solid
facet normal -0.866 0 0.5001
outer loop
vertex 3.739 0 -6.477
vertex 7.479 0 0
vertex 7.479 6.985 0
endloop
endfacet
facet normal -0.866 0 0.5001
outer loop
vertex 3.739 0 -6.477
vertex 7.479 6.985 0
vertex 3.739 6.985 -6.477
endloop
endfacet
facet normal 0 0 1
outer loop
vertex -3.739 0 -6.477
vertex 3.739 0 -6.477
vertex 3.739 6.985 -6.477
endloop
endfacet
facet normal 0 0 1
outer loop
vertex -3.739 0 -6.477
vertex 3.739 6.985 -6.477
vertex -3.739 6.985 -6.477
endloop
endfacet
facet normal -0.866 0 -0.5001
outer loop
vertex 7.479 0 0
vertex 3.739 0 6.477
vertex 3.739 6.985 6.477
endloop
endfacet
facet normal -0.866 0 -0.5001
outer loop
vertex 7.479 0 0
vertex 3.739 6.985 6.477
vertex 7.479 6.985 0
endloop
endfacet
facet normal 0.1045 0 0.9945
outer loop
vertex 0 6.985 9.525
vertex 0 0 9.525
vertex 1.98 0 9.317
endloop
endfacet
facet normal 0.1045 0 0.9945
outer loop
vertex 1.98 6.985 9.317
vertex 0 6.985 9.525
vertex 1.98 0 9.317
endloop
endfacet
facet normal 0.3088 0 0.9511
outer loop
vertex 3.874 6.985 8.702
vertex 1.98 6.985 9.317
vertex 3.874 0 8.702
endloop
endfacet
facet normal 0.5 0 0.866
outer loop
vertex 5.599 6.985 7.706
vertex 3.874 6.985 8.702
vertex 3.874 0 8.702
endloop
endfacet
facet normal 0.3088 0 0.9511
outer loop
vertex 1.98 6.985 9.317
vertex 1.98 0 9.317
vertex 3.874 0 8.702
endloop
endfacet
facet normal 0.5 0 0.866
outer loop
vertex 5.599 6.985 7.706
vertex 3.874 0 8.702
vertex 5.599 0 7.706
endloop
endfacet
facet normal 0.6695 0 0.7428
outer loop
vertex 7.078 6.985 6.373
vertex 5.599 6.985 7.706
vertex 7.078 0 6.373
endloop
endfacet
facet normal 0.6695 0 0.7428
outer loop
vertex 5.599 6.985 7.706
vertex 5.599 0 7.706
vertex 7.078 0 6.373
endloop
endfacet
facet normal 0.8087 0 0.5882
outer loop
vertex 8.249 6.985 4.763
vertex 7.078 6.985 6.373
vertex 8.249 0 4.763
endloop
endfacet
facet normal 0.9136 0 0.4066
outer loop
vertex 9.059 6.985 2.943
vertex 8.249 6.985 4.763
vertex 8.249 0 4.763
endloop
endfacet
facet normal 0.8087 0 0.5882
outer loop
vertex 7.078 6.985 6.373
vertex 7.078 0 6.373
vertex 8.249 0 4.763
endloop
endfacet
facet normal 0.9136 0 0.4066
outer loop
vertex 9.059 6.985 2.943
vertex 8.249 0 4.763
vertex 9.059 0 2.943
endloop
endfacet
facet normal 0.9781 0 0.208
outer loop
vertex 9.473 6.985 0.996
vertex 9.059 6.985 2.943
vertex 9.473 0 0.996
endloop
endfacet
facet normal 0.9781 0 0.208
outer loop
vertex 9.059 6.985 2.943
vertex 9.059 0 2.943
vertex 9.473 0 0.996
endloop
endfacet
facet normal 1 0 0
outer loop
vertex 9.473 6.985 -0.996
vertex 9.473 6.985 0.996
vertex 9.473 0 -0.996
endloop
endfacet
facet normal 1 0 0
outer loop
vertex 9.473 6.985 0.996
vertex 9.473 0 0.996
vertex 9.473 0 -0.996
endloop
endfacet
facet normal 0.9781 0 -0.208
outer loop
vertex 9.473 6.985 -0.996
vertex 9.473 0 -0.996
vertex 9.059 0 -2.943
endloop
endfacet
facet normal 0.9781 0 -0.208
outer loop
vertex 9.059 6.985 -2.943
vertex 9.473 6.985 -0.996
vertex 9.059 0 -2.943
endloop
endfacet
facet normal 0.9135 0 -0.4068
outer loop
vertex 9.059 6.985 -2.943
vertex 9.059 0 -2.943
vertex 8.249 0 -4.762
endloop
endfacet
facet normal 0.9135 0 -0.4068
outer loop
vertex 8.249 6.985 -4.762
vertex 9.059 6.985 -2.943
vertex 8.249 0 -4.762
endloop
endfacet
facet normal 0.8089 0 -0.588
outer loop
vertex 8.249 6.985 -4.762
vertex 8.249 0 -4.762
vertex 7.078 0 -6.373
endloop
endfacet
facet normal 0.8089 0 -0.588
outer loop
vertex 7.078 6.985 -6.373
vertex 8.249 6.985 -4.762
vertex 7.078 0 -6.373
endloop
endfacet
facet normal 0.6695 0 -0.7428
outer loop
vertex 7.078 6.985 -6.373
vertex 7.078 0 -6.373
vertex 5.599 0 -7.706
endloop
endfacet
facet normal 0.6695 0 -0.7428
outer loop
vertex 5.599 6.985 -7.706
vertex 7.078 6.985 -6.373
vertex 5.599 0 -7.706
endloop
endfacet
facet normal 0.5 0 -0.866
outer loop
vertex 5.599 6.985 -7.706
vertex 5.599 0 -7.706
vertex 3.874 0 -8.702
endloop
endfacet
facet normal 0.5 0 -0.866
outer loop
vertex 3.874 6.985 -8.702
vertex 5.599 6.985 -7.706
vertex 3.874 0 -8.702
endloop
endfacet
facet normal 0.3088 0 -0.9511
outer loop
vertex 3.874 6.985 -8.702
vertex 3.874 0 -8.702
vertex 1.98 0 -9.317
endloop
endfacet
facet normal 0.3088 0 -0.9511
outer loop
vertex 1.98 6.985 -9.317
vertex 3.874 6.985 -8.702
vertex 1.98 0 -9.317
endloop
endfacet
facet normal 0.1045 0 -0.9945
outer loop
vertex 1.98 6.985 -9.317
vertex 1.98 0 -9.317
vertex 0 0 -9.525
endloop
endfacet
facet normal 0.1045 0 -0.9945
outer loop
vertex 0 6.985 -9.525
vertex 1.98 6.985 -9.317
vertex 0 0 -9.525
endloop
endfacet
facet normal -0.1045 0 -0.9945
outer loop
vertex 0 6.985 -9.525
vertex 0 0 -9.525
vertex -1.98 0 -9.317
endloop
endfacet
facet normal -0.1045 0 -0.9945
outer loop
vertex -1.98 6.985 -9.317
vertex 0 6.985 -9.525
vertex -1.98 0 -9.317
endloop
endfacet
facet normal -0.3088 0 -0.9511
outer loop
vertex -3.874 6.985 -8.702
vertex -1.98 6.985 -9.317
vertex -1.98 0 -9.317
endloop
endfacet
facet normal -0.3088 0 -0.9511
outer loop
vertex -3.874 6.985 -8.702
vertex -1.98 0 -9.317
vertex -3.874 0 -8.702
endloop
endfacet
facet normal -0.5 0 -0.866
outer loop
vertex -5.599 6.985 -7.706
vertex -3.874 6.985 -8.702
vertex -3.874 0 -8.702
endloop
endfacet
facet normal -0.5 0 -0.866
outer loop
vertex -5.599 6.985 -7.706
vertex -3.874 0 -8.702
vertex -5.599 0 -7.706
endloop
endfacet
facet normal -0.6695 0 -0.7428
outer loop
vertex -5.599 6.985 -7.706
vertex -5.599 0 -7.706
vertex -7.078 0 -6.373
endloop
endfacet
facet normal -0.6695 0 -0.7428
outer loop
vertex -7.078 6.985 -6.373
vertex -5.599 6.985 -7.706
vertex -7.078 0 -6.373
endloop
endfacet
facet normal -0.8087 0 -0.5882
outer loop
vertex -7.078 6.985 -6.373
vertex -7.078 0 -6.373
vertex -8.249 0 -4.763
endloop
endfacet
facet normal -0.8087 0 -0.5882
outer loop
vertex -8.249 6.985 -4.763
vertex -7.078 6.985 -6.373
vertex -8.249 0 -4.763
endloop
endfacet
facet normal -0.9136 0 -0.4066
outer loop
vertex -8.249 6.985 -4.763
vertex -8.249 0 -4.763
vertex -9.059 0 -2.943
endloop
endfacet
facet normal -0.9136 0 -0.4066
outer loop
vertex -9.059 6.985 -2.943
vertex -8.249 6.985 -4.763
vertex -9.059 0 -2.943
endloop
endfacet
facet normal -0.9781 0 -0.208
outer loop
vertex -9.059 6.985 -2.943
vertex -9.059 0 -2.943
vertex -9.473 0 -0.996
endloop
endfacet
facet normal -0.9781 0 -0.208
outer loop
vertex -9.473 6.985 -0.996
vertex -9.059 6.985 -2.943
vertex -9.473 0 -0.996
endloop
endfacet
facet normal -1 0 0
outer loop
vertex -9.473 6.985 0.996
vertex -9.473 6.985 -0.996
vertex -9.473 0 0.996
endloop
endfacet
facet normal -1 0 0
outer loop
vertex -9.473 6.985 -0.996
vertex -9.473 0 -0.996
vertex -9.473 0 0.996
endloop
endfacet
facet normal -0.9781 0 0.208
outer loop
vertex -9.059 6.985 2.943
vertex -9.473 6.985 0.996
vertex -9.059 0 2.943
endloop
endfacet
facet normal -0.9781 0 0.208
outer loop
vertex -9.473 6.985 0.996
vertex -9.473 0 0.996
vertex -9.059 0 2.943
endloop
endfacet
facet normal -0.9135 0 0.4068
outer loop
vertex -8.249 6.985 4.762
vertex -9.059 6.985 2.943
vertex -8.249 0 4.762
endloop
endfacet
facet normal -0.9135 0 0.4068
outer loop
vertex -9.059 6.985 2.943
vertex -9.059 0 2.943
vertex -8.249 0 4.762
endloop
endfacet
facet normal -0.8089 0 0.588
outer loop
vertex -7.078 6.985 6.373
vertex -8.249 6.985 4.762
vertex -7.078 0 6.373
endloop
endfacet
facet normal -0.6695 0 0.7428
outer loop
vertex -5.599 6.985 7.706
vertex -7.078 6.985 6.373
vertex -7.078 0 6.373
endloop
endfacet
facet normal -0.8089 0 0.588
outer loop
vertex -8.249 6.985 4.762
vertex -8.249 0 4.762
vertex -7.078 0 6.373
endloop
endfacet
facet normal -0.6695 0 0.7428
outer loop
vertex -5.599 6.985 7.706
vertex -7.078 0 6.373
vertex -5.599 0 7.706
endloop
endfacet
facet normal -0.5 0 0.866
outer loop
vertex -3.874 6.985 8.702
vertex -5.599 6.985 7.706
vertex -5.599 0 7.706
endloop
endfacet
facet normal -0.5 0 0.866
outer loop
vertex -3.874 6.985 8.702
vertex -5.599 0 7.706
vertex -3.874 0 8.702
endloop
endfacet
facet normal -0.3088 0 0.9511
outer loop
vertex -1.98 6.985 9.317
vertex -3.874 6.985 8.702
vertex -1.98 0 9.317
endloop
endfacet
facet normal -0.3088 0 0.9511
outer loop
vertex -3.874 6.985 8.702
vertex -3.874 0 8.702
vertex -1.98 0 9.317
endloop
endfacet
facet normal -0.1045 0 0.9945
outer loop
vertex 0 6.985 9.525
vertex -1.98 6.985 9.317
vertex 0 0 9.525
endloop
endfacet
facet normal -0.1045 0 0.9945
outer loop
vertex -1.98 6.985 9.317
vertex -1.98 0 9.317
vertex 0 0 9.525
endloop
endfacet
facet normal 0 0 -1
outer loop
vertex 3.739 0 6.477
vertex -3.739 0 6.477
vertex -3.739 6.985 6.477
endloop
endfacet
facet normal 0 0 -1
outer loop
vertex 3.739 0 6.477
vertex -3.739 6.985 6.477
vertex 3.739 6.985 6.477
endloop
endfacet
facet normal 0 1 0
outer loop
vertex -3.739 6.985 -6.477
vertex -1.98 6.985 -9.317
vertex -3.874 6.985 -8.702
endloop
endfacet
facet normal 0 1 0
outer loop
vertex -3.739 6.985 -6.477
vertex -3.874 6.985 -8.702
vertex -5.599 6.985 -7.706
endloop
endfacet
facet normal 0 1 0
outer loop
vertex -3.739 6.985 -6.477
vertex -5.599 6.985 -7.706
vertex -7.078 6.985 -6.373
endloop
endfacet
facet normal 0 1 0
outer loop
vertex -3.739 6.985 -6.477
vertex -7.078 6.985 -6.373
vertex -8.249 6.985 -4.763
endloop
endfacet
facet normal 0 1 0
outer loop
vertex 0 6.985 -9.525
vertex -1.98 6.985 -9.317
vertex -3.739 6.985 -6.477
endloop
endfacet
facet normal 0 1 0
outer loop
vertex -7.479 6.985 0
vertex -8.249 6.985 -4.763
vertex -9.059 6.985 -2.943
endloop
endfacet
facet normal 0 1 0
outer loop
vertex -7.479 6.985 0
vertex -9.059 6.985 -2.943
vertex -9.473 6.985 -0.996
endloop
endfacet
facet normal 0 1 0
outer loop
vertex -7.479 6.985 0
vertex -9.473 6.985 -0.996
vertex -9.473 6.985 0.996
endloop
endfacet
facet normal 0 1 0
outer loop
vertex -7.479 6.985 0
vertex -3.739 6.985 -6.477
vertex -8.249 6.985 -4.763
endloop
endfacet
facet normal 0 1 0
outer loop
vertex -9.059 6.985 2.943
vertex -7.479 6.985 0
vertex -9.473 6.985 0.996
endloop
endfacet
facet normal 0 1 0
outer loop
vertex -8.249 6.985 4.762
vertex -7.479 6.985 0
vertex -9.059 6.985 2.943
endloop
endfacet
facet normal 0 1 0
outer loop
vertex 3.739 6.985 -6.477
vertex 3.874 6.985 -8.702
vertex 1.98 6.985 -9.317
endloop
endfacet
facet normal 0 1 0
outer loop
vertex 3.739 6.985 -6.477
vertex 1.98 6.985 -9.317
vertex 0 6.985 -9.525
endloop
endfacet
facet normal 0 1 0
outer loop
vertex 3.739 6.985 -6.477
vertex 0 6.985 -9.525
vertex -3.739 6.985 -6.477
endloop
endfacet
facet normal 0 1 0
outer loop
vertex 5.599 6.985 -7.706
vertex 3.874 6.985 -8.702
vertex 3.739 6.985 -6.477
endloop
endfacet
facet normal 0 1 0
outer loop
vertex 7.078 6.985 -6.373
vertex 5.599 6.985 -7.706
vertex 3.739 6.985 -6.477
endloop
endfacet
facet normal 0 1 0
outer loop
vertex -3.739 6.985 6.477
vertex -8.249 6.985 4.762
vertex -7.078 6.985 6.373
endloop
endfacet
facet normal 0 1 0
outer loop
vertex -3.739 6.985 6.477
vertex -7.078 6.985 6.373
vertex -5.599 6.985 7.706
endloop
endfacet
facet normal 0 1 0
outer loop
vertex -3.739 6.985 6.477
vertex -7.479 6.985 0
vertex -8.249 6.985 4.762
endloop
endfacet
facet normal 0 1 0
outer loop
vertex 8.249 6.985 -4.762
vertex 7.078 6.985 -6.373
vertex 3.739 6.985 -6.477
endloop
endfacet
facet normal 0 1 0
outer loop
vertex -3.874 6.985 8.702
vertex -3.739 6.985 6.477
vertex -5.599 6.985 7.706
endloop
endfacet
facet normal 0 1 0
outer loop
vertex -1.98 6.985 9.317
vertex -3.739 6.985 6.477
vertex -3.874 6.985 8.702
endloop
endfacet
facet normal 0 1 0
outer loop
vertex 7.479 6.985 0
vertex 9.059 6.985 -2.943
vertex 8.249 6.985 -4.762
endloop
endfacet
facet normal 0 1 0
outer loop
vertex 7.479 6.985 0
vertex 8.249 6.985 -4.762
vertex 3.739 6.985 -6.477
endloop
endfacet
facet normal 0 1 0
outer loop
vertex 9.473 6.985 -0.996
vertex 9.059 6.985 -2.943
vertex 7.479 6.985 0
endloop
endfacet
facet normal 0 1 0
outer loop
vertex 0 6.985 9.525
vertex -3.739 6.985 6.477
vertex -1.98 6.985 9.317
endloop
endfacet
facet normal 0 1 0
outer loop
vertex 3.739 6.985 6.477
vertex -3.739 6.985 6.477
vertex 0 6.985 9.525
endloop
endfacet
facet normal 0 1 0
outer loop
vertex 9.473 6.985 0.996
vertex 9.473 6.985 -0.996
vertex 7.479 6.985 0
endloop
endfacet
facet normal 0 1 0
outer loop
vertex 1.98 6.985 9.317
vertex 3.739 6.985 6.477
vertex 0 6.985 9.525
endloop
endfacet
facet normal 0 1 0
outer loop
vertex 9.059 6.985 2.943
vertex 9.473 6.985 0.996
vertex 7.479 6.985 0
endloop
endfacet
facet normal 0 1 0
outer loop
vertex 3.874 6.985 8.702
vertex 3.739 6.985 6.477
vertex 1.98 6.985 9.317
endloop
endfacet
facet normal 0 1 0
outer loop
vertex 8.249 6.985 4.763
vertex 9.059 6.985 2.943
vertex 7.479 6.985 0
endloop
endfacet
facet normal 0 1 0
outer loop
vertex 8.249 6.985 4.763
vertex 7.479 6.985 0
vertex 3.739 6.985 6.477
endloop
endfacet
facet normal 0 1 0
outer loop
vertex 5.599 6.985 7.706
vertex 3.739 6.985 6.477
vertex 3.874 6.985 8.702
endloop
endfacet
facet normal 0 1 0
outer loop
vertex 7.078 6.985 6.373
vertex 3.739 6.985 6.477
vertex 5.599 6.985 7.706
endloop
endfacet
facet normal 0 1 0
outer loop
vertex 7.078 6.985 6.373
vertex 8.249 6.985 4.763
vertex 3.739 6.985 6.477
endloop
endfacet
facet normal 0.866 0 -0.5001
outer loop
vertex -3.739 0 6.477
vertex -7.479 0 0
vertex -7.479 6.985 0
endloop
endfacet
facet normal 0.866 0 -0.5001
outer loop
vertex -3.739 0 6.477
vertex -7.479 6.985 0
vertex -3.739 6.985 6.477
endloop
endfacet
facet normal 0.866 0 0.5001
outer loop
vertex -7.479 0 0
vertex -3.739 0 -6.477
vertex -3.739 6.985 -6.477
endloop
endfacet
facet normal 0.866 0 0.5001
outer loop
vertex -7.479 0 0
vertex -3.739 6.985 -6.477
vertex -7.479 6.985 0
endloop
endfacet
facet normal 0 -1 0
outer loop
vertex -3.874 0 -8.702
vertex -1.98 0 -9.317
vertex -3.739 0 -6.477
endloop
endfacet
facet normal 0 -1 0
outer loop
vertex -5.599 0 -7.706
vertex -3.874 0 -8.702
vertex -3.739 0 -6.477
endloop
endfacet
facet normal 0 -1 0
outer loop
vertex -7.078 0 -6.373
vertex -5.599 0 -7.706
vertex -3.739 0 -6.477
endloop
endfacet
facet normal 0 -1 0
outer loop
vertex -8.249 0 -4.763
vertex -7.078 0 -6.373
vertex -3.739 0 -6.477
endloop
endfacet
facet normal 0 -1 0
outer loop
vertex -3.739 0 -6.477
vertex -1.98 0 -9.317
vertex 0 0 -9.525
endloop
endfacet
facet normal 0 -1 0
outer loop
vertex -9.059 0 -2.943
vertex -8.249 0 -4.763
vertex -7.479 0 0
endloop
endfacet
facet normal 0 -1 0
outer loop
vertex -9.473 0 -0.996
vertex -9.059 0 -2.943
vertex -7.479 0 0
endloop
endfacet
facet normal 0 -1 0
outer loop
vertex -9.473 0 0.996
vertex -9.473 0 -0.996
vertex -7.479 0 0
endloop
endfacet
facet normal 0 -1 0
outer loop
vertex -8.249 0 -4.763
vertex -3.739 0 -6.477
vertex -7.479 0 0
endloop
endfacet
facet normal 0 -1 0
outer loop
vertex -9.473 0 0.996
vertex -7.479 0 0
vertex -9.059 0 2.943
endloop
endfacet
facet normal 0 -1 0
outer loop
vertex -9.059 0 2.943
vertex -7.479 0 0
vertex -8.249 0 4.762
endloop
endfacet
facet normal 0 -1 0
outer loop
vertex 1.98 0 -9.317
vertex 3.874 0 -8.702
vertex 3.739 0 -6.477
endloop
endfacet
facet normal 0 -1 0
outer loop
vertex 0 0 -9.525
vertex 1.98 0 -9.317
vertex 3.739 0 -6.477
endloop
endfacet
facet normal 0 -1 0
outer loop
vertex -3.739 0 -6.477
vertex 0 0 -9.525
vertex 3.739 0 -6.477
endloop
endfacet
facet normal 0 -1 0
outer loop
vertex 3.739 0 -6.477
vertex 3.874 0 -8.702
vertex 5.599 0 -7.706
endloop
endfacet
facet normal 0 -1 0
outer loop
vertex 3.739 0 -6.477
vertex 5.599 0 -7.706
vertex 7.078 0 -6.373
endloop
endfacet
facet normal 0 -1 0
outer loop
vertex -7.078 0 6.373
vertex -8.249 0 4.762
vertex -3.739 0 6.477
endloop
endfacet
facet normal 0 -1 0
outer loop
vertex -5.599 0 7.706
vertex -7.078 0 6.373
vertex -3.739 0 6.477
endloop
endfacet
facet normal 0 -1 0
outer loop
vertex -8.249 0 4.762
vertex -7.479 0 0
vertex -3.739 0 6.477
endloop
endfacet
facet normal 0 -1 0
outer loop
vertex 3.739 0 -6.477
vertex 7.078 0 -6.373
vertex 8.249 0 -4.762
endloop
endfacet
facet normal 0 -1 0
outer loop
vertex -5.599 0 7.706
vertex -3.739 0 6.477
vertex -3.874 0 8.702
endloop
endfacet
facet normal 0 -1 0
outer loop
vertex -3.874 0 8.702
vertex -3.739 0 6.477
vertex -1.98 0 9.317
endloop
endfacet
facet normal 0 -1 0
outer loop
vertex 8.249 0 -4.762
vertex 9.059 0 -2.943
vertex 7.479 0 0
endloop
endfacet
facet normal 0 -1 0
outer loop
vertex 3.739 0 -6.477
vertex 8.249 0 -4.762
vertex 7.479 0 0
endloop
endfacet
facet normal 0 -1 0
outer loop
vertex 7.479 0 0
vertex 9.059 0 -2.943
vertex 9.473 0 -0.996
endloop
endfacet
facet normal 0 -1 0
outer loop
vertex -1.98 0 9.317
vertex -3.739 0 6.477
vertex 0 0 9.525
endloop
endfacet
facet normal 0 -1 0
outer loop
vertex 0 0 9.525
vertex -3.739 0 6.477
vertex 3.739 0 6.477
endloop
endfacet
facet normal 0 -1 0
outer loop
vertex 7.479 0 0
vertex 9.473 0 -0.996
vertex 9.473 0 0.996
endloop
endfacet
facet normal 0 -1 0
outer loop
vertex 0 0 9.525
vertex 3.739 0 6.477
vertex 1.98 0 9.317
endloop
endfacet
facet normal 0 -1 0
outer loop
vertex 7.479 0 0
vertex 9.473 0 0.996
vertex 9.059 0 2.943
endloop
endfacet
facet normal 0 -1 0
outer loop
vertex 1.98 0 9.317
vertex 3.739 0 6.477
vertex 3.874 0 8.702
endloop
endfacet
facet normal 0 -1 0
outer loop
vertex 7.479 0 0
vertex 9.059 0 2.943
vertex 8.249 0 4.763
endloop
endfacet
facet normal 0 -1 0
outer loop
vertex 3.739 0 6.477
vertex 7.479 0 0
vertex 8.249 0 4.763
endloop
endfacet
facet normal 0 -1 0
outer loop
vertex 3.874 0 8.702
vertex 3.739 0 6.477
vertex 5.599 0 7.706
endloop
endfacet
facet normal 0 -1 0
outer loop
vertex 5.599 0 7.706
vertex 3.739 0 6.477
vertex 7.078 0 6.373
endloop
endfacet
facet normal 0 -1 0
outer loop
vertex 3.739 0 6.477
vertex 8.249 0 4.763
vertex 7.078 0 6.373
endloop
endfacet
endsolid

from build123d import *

# Parameters (mm, degrees)
SKETCH1_R           = 9.525
BOSS_EXTRUDE1_DEPTH = 63.5
CUT_EXTRUDE2_START  = -56.515
SKETCH3_R           = 9.525
CUT_EXTRUDE2_DEPTH  = 56.515


with BuildPart() as part:
    # Sketch1 → Boss-Extrude1 (new body)
    with BuildSketch(Plane(origin=(0, 0, 0), x_dir=(1, 0, 0), z_dir=(0, 1, 0))):
        with Locations(Location((0, 0, 0), (0, 0, 270))):
            Circle(SKETCH1_R)
        Polygon((7.478995387, 0), (3.739497694, 6.477), (-3.739497694, 6.477), (-7.478995387, 0), (-3.739497694, -6.477), (3.739497694, -6.477), align=None, mode=Mode.SUBTRACT)
    extrude(amount=BOSS_EXTRUDE1_DEPTH)

    # Sketch3 → Cut-Extrude2 (cut)
    with BuildSketch(Plane(origin=(0, 63.5, 0), x_dir=(1, 0, 0), z_dir=(0, 1, 0)).offset(CUT_EXTRUDE2_START)):
        with Locations(Location((0, 0, 0), (0, 0, 270))):
            Circle(SKETCH3_R)
    extrude(amount=CUT_EXTRUDE2_DEPTH, mode=Mode.SUBTRACT)


solid = part.part
